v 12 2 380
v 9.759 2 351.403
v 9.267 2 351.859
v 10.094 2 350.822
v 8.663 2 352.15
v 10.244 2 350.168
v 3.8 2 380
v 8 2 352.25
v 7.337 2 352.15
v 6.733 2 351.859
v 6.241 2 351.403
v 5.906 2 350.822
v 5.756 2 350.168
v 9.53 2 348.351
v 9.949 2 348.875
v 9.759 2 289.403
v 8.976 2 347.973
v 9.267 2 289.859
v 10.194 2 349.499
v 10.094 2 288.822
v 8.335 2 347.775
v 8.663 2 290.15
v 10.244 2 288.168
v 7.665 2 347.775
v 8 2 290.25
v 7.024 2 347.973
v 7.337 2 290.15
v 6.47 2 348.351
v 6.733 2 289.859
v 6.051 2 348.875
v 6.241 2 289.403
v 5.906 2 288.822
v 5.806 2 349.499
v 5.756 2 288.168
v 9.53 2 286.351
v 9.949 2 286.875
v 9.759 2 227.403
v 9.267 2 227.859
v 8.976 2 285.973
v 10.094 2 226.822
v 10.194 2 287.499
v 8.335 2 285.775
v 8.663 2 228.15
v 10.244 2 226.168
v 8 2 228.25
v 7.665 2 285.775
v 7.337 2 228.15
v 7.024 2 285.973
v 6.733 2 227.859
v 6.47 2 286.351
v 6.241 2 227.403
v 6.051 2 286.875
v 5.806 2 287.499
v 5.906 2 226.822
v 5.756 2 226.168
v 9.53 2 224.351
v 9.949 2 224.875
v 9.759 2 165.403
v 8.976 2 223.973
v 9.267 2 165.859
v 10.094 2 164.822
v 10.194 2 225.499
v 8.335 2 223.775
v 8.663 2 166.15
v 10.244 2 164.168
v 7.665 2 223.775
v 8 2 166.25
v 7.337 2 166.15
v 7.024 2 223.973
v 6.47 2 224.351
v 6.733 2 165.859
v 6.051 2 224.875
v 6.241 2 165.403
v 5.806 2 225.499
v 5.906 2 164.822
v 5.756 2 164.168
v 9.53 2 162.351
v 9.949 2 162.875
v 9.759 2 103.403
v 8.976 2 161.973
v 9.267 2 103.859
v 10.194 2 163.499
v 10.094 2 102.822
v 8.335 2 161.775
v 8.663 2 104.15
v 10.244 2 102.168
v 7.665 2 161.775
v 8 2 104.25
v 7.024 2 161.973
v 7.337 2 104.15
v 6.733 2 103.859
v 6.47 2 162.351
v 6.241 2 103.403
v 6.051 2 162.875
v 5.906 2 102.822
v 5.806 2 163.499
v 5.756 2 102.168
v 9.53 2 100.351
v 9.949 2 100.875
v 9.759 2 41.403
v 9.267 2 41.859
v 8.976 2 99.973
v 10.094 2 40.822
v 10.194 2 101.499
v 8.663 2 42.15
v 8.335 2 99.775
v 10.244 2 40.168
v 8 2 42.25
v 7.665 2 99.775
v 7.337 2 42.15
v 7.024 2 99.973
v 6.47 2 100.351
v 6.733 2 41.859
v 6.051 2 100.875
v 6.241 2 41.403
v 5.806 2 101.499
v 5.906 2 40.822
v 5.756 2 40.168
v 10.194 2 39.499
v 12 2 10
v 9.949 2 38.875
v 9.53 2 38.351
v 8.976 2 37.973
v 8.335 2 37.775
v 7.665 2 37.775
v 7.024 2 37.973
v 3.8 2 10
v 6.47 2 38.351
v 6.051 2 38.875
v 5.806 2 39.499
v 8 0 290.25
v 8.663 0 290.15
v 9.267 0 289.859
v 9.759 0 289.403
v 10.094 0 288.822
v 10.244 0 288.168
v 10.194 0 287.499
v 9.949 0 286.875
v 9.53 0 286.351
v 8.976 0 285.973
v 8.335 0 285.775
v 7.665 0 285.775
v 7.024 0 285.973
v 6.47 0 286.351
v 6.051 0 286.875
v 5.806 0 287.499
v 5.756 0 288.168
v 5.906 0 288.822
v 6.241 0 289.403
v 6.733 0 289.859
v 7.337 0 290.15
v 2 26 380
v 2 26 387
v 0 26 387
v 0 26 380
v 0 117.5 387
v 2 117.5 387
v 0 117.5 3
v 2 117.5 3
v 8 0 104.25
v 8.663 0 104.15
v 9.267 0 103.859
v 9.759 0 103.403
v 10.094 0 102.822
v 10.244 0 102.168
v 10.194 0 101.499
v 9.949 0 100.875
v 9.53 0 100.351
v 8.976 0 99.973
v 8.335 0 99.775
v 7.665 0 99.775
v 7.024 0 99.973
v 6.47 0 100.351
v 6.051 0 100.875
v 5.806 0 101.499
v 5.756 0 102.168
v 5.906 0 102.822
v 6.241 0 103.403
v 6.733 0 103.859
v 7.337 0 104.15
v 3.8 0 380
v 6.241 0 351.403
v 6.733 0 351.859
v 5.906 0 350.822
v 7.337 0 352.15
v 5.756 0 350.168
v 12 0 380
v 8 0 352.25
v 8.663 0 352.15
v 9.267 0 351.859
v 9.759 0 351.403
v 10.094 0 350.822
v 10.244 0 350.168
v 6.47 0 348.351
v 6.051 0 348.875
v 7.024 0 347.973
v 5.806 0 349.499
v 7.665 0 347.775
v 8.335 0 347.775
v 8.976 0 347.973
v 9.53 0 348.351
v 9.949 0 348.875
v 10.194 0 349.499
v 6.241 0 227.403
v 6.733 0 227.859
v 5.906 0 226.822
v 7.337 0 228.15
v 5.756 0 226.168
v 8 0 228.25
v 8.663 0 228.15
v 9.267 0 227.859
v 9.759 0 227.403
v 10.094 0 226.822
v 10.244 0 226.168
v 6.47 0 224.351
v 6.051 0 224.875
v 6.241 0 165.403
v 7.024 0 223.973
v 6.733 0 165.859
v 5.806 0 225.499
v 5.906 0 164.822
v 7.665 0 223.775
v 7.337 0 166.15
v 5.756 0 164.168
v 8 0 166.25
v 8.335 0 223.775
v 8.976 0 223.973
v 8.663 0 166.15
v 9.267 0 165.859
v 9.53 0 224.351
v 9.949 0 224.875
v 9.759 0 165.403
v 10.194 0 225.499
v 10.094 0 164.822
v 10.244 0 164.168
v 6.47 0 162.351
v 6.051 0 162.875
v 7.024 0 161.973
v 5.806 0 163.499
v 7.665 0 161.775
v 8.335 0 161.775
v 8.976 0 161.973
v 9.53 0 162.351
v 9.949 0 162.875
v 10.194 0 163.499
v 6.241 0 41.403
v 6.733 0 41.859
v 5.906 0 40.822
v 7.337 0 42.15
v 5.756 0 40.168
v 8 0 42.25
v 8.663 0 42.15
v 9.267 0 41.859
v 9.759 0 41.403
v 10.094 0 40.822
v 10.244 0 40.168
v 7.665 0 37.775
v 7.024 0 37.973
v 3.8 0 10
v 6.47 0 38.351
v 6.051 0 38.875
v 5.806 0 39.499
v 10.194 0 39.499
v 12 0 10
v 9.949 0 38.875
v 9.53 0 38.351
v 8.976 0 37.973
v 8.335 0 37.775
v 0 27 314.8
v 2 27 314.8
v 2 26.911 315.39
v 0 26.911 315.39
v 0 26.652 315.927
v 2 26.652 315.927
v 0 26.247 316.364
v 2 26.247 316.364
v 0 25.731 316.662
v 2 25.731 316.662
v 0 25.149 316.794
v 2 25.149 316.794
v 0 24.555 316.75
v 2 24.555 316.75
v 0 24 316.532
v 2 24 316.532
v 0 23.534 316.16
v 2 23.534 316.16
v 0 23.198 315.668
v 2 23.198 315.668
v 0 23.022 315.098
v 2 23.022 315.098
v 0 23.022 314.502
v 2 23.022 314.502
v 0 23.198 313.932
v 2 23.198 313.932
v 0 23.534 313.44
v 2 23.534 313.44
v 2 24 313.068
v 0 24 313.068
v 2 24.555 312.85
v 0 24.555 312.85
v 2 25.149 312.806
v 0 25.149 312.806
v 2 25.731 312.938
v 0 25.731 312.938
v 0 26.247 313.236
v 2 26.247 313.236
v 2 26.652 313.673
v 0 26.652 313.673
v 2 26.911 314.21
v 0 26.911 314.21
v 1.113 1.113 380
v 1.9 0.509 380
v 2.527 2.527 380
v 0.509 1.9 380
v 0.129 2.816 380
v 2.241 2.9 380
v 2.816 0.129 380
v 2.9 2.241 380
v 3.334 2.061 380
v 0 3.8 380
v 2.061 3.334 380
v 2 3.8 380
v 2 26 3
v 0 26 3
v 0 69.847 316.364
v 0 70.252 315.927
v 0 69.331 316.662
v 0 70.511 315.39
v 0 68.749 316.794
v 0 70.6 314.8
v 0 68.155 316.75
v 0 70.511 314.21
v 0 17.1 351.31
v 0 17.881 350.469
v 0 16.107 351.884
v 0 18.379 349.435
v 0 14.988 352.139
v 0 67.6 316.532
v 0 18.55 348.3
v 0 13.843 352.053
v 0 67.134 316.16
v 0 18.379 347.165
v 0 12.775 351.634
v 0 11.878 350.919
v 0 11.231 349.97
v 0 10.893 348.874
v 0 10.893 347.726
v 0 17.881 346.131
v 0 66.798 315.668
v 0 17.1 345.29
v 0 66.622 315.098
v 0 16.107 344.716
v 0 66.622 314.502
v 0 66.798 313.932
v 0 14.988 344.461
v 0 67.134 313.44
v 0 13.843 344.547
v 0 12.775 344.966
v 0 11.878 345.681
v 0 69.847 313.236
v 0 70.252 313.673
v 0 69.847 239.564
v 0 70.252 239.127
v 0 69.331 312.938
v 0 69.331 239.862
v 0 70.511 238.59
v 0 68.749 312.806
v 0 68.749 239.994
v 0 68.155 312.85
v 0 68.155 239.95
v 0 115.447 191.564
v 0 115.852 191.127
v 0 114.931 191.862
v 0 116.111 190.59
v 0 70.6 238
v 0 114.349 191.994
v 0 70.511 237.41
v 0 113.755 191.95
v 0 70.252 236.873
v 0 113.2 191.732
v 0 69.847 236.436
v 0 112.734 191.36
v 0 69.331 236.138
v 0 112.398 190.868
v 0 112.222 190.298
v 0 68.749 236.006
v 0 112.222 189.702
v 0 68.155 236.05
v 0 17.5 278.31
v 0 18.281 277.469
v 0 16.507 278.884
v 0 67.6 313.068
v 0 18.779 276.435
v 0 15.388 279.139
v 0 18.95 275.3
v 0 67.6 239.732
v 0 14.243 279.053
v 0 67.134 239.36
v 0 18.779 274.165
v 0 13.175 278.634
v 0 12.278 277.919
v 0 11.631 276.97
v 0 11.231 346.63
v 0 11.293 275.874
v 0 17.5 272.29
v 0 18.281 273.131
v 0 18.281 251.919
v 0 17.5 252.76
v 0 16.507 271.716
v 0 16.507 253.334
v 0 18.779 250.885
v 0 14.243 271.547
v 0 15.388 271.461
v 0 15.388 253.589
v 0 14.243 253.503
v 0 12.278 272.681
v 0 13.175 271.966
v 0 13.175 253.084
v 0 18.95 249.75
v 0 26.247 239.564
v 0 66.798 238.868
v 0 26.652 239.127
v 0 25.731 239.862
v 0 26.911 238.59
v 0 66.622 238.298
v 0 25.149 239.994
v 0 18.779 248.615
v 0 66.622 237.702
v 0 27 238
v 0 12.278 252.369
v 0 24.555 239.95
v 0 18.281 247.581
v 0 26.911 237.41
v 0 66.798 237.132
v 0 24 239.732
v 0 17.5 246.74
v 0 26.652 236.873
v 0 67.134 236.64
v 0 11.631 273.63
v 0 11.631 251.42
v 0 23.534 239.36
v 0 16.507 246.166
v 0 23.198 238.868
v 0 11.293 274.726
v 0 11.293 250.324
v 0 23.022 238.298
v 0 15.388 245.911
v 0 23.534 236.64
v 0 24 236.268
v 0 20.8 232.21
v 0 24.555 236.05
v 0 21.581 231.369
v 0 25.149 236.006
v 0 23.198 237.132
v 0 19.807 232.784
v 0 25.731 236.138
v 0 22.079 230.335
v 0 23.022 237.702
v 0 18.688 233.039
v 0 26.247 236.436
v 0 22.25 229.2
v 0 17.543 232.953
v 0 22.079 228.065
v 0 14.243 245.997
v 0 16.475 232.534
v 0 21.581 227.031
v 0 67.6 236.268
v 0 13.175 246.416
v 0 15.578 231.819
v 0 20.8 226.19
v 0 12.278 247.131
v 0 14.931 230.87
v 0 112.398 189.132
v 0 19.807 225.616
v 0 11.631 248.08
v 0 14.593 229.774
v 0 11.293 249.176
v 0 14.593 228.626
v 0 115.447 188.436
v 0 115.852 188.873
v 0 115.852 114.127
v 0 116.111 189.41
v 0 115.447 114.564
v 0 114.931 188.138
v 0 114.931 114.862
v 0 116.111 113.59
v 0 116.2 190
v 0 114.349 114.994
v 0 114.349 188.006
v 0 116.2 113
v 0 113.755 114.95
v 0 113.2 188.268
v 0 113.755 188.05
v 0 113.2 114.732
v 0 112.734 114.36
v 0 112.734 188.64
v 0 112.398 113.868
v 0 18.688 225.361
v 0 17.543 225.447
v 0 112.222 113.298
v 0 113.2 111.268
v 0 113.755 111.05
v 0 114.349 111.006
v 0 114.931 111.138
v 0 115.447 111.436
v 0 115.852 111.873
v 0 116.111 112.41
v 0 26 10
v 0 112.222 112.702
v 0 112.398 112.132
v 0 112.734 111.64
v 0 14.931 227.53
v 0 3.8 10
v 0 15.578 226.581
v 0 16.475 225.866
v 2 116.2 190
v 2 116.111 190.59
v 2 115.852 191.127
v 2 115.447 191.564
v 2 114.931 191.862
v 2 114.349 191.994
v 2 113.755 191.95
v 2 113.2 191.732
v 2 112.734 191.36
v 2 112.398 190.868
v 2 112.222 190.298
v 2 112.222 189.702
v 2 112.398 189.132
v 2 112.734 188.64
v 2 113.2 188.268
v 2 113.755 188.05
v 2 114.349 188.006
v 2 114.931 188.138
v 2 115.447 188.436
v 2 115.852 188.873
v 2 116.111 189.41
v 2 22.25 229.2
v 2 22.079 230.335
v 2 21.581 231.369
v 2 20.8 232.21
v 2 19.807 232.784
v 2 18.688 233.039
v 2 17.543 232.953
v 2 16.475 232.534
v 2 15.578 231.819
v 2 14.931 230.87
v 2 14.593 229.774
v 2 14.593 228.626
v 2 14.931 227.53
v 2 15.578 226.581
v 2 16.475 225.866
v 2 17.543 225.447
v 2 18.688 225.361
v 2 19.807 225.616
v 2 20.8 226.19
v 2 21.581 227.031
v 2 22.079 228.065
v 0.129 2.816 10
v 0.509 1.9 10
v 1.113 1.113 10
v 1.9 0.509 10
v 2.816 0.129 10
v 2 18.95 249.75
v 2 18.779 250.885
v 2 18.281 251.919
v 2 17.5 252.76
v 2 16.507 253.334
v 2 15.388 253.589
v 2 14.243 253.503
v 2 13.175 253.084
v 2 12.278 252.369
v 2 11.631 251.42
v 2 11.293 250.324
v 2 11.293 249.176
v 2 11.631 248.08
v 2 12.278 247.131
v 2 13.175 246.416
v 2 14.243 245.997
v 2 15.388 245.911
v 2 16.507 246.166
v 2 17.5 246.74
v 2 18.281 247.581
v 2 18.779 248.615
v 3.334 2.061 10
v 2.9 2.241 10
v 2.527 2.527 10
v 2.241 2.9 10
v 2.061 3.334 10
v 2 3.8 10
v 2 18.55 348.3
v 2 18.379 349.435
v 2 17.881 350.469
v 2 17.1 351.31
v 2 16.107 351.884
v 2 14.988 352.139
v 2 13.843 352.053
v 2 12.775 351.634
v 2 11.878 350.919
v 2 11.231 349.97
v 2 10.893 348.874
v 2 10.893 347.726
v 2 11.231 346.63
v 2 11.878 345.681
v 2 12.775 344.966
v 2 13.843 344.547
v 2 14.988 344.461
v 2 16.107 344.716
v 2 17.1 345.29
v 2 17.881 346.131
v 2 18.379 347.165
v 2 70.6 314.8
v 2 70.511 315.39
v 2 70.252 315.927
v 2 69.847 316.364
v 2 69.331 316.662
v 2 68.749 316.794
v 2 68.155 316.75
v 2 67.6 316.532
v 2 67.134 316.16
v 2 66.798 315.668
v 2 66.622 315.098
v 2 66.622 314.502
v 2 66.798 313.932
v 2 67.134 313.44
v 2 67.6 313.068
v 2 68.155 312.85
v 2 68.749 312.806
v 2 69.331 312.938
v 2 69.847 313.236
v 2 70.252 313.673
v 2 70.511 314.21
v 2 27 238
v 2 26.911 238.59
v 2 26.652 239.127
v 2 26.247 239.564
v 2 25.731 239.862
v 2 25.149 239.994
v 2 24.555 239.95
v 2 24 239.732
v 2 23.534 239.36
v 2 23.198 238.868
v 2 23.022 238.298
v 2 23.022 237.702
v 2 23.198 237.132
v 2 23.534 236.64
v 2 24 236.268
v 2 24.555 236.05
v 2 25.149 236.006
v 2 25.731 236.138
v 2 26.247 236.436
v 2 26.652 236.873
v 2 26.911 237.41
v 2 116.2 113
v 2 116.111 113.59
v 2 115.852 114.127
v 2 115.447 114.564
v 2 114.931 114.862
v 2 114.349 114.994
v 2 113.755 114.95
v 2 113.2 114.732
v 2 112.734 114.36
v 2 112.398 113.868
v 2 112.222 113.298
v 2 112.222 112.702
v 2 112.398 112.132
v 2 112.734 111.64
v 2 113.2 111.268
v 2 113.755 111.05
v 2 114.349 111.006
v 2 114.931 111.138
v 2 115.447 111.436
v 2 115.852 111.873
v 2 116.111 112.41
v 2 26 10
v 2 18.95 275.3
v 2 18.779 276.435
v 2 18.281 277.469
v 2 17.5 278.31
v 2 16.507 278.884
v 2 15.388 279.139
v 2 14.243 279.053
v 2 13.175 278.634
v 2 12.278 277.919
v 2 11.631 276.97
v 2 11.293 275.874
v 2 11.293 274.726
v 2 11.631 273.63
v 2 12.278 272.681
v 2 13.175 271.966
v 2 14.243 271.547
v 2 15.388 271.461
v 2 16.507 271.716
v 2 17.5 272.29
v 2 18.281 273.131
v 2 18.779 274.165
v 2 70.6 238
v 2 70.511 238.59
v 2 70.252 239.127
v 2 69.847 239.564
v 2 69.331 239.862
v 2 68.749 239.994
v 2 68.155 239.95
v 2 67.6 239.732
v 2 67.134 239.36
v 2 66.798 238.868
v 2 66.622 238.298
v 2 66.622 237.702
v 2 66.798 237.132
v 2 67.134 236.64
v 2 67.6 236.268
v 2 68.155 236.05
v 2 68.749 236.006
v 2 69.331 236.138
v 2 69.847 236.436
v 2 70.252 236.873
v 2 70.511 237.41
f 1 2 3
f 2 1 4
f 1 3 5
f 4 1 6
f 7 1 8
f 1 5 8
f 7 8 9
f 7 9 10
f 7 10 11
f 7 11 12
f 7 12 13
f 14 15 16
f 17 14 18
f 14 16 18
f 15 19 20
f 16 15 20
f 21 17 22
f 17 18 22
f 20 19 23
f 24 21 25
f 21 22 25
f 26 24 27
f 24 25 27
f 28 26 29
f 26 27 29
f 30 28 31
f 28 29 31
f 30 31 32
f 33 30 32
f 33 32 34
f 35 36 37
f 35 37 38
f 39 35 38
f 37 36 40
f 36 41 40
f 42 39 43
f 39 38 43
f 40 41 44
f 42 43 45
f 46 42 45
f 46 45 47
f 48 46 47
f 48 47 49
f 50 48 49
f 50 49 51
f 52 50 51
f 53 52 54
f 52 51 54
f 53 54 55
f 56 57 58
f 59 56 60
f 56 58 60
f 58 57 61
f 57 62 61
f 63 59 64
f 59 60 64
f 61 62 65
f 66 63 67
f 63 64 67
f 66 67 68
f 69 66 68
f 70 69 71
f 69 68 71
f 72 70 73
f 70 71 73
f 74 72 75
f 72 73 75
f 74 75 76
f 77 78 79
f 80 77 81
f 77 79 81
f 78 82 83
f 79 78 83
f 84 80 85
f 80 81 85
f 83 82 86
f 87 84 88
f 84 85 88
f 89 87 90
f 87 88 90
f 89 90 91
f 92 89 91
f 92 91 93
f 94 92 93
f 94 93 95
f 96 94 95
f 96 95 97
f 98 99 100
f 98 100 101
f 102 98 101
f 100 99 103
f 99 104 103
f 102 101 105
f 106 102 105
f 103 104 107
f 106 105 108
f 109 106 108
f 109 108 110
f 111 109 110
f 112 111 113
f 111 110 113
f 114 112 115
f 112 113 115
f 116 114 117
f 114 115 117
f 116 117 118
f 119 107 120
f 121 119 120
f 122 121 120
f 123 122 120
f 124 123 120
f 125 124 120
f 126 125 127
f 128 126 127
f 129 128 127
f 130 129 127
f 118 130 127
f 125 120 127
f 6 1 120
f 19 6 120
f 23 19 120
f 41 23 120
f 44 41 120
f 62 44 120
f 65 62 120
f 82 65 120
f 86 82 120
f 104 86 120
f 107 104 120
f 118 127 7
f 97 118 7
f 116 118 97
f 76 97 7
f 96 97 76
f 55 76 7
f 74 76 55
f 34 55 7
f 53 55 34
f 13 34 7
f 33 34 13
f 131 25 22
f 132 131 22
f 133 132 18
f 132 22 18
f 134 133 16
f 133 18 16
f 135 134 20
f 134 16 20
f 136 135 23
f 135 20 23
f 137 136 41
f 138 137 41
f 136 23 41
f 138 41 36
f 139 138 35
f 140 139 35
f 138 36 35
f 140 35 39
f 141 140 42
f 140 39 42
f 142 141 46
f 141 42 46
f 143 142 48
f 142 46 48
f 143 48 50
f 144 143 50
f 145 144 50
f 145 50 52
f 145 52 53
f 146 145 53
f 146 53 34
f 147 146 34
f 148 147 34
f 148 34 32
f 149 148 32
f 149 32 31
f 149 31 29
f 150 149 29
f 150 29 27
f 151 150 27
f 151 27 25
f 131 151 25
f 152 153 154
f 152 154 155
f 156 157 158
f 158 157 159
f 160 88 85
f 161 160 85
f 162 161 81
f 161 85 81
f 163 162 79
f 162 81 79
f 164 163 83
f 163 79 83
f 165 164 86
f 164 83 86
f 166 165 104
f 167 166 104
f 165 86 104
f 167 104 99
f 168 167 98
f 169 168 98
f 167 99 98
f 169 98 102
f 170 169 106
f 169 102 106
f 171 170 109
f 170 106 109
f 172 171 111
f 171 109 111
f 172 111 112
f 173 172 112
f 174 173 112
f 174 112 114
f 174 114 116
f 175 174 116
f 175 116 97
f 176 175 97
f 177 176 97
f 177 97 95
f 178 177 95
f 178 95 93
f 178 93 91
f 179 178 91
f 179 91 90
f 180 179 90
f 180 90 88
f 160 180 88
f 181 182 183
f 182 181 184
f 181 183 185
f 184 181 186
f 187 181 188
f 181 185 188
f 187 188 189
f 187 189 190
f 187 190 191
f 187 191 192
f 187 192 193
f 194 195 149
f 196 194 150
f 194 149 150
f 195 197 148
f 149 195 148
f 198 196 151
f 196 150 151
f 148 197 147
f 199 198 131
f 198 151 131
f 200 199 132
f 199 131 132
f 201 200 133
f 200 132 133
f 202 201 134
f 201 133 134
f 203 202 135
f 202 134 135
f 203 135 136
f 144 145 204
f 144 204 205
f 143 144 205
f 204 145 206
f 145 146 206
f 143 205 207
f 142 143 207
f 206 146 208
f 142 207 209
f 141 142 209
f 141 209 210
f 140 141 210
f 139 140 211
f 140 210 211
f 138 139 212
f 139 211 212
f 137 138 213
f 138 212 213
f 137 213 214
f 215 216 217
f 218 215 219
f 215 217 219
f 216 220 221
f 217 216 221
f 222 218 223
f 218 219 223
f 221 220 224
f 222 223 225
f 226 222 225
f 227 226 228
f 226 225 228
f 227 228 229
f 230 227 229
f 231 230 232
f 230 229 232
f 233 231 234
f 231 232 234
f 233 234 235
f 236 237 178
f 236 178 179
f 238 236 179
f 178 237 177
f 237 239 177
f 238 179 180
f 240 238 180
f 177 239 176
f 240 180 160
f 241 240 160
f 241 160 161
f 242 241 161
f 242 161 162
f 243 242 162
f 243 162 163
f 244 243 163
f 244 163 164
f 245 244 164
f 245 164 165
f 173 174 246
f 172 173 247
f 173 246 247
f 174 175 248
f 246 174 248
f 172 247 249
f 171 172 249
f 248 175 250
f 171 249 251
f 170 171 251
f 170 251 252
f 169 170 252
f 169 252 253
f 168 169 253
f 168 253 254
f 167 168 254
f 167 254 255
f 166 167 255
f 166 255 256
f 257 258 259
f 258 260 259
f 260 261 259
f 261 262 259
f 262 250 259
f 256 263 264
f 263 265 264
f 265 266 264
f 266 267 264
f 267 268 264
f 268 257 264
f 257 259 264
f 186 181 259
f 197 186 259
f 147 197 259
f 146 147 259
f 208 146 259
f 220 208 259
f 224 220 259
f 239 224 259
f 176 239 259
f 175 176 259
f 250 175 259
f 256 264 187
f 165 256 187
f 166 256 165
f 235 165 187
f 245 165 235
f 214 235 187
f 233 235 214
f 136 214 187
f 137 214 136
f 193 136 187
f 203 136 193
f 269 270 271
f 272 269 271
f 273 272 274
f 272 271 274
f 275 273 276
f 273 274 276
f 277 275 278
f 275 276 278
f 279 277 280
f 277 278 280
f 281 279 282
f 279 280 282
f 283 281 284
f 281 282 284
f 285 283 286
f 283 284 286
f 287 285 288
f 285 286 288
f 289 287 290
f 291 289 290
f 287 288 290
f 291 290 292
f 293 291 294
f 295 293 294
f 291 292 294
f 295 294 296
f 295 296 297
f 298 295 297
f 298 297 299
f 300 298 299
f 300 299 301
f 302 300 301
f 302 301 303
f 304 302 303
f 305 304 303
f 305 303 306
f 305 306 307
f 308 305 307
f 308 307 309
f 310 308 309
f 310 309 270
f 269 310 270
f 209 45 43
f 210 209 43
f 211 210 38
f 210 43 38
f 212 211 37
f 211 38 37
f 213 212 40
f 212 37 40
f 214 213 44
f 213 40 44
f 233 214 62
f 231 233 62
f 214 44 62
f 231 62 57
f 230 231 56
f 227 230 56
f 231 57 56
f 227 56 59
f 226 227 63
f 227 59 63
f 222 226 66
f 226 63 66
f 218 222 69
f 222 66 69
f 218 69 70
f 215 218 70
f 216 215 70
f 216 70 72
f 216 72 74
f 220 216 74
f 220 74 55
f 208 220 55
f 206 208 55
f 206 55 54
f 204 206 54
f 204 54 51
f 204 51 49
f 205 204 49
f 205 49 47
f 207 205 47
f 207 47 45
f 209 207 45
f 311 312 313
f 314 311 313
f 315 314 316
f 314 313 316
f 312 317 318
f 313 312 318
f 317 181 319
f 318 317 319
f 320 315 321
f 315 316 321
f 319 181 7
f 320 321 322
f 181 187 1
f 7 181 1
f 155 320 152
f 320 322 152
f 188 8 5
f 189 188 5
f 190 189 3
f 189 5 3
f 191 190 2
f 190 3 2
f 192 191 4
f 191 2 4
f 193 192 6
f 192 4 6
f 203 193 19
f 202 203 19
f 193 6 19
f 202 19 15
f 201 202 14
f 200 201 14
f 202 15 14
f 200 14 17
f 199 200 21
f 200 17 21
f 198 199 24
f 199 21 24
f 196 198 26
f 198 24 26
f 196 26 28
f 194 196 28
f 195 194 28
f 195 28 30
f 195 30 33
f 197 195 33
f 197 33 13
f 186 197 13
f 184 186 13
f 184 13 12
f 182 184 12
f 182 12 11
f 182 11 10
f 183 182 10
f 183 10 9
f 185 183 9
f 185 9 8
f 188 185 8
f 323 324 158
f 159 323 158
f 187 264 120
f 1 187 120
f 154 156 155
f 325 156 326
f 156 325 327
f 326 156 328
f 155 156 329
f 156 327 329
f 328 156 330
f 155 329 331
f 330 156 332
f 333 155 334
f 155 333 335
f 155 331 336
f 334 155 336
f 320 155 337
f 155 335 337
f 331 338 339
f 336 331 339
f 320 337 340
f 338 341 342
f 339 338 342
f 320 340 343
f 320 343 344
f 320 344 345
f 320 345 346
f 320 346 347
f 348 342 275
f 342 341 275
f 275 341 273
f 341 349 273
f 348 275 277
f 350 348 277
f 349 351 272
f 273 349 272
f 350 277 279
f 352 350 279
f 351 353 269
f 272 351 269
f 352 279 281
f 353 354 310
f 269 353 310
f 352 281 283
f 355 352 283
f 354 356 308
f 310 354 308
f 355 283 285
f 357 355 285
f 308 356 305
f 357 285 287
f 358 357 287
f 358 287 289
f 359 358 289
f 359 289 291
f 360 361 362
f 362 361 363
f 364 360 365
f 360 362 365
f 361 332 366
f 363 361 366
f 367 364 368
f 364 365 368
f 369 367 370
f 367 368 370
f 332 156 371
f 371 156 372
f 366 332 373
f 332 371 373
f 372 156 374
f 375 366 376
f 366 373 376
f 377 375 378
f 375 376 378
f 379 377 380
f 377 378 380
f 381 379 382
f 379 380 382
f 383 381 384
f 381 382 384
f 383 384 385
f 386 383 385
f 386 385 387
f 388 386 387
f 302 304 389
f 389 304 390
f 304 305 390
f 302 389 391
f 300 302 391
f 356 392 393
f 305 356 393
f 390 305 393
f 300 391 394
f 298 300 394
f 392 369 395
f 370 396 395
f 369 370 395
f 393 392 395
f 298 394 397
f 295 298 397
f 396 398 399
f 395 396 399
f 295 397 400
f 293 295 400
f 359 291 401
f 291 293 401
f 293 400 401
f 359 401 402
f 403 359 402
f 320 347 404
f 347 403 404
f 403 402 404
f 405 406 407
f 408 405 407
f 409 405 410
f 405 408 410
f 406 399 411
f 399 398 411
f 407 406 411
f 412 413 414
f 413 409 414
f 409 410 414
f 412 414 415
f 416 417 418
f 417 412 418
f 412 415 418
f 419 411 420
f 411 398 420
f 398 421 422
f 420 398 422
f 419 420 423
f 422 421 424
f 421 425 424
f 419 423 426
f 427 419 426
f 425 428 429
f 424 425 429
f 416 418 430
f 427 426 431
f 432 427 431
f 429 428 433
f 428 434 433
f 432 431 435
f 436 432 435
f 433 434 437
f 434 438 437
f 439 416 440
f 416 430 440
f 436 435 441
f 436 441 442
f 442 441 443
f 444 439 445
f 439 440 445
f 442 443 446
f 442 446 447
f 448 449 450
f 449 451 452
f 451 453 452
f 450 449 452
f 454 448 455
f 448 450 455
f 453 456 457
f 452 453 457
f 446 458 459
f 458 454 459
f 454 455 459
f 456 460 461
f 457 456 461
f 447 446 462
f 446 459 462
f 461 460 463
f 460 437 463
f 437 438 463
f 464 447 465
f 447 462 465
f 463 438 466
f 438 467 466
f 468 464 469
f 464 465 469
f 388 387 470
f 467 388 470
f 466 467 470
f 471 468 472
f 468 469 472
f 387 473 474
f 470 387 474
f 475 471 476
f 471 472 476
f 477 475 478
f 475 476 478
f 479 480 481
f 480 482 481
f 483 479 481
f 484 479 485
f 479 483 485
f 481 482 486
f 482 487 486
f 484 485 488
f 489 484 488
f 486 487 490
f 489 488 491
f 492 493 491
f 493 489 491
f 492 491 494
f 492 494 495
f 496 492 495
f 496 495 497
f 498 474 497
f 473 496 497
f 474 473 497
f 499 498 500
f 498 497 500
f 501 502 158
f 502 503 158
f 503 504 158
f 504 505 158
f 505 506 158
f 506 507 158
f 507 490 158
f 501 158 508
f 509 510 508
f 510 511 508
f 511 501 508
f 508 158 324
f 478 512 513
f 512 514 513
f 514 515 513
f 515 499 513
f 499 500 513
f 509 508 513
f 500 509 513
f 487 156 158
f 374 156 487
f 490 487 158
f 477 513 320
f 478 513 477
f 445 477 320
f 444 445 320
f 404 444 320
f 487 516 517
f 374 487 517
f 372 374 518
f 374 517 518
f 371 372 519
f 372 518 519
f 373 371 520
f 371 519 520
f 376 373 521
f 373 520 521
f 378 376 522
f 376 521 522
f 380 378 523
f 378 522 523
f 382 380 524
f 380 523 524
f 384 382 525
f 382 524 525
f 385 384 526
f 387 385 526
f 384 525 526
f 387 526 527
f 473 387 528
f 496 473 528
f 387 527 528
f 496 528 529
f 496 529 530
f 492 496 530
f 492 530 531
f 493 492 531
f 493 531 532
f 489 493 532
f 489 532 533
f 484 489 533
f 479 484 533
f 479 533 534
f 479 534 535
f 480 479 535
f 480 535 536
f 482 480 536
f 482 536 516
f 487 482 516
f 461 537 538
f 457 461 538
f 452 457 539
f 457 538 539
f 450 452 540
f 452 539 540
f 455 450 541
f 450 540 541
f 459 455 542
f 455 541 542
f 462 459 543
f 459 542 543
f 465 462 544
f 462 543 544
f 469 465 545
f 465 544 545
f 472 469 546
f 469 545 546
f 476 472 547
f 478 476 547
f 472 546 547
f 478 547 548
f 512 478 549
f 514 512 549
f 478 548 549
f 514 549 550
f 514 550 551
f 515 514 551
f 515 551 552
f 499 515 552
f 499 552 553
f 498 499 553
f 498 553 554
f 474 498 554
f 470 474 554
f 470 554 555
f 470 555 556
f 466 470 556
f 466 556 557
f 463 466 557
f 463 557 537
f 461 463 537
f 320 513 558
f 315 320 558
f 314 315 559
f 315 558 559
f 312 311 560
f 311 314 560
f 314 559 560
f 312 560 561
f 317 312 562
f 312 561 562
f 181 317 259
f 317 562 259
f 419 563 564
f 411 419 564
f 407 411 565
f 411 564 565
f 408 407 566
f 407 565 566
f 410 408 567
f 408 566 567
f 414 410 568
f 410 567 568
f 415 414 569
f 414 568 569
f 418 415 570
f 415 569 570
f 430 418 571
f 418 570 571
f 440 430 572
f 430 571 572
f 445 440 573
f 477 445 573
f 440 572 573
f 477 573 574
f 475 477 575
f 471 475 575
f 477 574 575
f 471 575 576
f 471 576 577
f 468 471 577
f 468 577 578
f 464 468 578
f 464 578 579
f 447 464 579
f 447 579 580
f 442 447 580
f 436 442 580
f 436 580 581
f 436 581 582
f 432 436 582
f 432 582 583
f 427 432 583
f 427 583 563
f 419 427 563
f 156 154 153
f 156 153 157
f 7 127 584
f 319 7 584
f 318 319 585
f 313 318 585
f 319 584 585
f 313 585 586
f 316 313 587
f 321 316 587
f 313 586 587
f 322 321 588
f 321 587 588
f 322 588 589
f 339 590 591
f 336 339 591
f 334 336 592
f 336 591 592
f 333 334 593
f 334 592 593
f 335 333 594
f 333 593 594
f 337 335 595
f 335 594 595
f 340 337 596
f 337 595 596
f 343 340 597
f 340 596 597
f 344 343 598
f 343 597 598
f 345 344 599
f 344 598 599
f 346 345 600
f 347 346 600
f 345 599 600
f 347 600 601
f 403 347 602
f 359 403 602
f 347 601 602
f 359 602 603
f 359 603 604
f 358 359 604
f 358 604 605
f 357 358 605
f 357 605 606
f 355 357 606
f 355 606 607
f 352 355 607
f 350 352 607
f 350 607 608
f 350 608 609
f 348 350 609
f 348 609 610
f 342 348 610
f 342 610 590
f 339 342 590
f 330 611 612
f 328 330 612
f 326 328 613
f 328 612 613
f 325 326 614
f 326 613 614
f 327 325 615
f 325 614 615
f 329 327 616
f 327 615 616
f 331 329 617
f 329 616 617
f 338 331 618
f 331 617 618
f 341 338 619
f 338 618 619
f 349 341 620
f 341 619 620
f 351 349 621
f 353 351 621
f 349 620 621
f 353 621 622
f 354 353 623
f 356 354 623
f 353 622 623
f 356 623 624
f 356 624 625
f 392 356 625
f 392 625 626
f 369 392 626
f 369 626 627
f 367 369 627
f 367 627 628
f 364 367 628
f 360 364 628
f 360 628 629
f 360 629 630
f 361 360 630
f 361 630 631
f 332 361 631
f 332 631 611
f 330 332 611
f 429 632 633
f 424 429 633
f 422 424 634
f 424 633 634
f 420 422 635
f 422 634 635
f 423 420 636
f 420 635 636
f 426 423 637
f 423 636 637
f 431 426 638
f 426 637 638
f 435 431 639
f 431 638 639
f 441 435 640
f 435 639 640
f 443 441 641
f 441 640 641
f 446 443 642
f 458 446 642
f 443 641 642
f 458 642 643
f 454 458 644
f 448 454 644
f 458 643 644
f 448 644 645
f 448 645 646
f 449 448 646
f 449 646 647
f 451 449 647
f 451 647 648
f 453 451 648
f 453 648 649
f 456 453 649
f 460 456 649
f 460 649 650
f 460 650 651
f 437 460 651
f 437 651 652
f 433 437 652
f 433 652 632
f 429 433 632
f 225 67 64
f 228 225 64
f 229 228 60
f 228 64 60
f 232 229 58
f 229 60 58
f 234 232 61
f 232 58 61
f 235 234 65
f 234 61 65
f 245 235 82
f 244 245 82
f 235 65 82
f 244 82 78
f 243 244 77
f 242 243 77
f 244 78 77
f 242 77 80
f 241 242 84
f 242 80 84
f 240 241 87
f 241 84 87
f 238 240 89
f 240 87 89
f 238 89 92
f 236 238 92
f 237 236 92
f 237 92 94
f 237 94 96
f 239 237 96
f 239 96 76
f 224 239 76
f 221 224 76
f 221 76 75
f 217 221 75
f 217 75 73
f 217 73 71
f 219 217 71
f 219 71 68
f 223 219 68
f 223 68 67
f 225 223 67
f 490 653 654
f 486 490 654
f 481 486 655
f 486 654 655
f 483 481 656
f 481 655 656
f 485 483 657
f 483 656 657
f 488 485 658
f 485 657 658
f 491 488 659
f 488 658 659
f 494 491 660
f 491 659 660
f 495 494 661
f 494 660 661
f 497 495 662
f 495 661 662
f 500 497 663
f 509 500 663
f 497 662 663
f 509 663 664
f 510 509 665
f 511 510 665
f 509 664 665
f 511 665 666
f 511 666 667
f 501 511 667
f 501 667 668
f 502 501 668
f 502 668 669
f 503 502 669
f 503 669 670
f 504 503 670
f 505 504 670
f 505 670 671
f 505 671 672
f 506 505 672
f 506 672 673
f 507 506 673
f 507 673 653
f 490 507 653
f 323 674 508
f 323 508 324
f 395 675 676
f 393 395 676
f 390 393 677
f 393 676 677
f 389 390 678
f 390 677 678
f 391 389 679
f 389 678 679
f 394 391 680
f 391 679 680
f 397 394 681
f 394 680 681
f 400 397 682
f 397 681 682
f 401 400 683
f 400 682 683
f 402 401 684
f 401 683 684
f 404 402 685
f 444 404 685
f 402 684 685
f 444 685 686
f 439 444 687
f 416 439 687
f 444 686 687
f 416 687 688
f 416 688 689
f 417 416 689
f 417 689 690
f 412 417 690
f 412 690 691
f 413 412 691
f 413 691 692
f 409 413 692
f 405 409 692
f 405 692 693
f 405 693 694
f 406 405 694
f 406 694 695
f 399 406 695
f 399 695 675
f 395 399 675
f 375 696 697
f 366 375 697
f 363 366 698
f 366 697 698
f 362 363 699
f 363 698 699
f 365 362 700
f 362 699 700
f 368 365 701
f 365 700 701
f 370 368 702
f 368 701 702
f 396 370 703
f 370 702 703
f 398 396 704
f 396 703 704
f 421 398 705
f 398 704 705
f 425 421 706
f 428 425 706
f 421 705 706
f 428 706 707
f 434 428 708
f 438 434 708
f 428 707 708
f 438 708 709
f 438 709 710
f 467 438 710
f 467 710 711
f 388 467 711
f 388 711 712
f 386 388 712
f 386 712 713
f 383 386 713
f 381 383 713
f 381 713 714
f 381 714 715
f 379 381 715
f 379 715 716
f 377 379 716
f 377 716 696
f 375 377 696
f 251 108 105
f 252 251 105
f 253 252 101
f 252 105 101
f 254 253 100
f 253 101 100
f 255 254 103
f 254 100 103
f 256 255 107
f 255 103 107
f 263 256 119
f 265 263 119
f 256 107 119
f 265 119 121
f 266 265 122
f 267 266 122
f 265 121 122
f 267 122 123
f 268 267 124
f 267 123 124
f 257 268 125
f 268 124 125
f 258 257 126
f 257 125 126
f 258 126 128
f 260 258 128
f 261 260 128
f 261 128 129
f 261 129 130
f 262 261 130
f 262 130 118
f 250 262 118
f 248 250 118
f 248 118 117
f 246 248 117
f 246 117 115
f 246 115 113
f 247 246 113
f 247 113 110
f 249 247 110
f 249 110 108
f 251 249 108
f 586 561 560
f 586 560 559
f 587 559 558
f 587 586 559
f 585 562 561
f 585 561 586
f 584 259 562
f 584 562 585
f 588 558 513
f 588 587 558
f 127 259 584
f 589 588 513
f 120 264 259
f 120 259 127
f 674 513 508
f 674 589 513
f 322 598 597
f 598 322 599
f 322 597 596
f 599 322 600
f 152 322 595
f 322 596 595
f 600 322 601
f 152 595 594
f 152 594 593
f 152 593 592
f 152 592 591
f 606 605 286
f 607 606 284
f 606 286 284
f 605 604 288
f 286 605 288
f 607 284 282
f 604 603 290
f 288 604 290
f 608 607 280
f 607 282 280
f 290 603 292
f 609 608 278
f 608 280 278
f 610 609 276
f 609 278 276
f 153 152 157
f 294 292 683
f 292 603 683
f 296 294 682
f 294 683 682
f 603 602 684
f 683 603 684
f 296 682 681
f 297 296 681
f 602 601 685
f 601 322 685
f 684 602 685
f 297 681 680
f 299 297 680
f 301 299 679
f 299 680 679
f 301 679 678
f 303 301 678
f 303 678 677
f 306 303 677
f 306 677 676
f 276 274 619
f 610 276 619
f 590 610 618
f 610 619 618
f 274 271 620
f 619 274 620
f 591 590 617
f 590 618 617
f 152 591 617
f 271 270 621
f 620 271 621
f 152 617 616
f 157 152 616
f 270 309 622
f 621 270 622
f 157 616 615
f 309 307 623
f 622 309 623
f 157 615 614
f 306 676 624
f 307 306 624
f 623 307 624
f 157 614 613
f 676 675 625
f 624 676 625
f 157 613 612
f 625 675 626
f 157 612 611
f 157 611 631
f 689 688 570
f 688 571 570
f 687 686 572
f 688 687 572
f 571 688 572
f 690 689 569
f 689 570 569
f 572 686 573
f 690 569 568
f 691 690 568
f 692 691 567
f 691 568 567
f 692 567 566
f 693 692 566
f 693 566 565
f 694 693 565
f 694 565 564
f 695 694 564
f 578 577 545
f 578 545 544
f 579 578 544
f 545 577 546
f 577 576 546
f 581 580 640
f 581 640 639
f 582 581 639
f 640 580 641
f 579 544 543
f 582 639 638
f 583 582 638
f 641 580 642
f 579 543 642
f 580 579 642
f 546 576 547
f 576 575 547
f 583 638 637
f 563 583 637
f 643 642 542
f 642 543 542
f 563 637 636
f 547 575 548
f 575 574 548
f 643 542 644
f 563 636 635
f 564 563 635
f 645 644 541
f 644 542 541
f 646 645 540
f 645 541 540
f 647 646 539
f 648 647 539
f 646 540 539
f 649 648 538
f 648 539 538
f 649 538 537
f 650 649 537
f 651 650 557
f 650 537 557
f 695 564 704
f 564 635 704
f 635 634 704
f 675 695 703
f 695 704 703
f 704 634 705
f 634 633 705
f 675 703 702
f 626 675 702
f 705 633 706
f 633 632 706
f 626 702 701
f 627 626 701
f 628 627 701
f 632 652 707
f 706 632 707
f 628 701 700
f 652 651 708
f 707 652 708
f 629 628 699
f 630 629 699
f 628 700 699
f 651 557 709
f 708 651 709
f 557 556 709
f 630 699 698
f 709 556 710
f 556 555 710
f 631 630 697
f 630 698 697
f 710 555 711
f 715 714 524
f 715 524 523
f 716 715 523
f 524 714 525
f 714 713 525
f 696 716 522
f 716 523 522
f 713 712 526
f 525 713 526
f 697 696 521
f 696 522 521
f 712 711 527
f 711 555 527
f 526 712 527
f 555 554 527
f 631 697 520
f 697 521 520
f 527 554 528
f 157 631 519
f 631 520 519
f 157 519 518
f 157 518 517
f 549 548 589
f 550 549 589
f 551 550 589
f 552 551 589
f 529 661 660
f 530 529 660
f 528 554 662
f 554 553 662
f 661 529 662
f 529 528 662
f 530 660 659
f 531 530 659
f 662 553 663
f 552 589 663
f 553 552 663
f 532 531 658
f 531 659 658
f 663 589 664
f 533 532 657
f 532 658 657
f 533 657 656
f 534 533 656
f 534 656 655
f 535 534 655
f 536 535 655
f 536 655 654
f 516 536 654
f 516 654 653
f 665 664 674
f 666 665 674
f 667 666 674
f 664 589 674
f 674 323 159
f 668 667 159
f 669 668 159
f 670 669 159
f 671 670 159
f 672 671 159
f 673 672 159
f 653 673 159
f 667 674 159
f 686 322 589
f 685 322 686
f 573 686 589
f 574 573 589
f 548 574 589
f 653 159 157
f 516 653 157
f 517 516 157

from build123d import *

# Parameters (mm, degrees)
FLANGE_BASE1_DEPTH    = 390
ESBO_O6_R             = 2
ESBO_O6_R_2           = 3.85
ESBO_O6_W             = 10
ESBO_O6_H             = 26
CORTE_EXTRUS_O1_DEPTH = 98
ESBO_O7_R             = 2.25
CORTE_EXTRUS_O2_DEPTH = 98
ESBO_O8_W             = 3
ESBO_O8_H             = 94
CORTE_EXTRUS_O3_DEPTH = 10
ESBO_O9_W             = 384
ESBO_O9_H             = 2.5
CORTE_EXTRUS_O4_DEPTH = 10


# Sheet-metal steps are written as plain solids
with BuildPart() as part:
    # Esboço1 → Flange-base1 (new body)
    with BuildSketch(Plane.XY):
        with BuildLine():
            Line((0, 120), (0, 3.8))
            ThreePointArc((0, 3.8), (1.112994231, 1.112994231), (3.8, 0))
            Line((3.8, 0), (12, 0))
            Line((12, 0), (12, 2))
            Line((12, 2), (3.8, 2))
            ThreePointArc((3.8, 2), (2.527207794, 2.527207794), (2, 3.8))
            Line((2, 3.8), (2, 120))
            Line((2, 120), (0, 120))
        make_face()
    extrude(amount=FLANGE_BASE1_DEPTH)

    # Esboço6 → Corte-extrusão1 (cut)
    with BuildSketch(Plane(origin=(12, 0, 0), x_dir=(0, 0, -1), z_dir=(1, 0, 0))):
        with Locations(Location((-314.8, 25, 0), (0, 0, 90))):
            Circle(ESBO_O6_R)
        with Locations(Location((-314.8, 68.6, 0), (0, 0, 90))):
            Circle(ESBO_O6_R)
        with Locations(Location((-238, 25, 0), (0, 0, 90))):
            Circle(ESBO_O6_R)
        with Locations(Location((-238, 68.6, 0), (0, 0, 90))):
            Circle(ESBO_O6_R)
        with Locations(Location((-275.3, 15.1, 0), (0, 0, 90))):
            Circle(ESBO_O6_R_2)
        with Locations(Location((-249.75, 15.1, 0), (0, 0, 90))):
            Circle(ESBO_O6_R_2)
        with Locations(Location((-229.2, 18.4, 0), (0, 0, 90))):
            Circle(ESBO_O6_R_2)
        with Locations(Location((-190, 114.2, 0), (0, 0, 90))):
            Circle(ESBO_O6_R)
        with Locations(Location((-113, 114.2, 0), (0, 0, 90))):
            Circle(ESBO_O6_R)
        with Locations(Location((-348.3, 14.7, 0), (0, 0, 90))):
            Circle(ESBO_O6_R_2)
        with Locations((-5, 13)):
            Rectangle(ESBO_O6_W, ESBO_O6_H)
        with Locations((-385, 13)):
            Rectangle(ESBO_O6_W, ESBO_O6_H)
    extrude(amount=-CORTE_EXTRUS_O1_DEPTH, mode=Mode.SUBTRACT)

    # Esboço7 → Corte-extrusão2 (cut)
    with BuildSketch(Plane(origin=(0, 2, 0), x_dir=(1, 0, 0), z_dir=(0, 1, 0))):
        with Locations(Location((8, -350, 0), (0, 0, 270))):
            Circle(ESBO_O7_R)
        with Locations(Location((8, -288, 0), (0, 0, 270))):
            Circle(ESBO_O7_R)
        with Locations(Location((8, -226, 0), (0, 0, 270))):
            Circle(ESBO_O7_R)
        with Locations(Location((8, -164, 0), (0, 0, 270))):
            Circle(ESBO_O7_R)
        with Locations(Location((8, -102, 0), (0, 0, 270))):
            Circle(ESBO_O7_R)
        with Locations(Location((8, -40, 0), (0, 0, 270))):
            Circle(ESBO_O7_R)
    extrude(amount=-CORTE_EXTRUS_O2_DEPTH, mode=Mode.SUBTRACT)

    # Esboço8 → Corte-extrusão3 (cut)
    with BuildSketch(Plane.ZY):
        with Locations((1.5, 73)):
            Rectangle(ESBO_O8_W, ESBO_O8_H)
        with Locations((388.5, 73)):
            Rectangle(ESBO_O8_W, ESBO_O8_H)
    extrude(amount=-CORTE_EXTRUS_O3_DEPTH, mode=Mode.SUBTRACT)

    # Esboço9 → Corte-extrusão4 (cut)
    with BuildSketch(Plane(origin=(2, 0, 0), x_dir=(0, 0, -1), z_dir=(1, 0, 0))):
        with Locations((-195, 118.75)):
            Rectangle(ESBO_O9_W, ESBO_O9_H)
    extrude(amount=-CORTE_EXTRUS_O4_DEPTH, mode=Mode.SUBTRACT)


solid = part.part
